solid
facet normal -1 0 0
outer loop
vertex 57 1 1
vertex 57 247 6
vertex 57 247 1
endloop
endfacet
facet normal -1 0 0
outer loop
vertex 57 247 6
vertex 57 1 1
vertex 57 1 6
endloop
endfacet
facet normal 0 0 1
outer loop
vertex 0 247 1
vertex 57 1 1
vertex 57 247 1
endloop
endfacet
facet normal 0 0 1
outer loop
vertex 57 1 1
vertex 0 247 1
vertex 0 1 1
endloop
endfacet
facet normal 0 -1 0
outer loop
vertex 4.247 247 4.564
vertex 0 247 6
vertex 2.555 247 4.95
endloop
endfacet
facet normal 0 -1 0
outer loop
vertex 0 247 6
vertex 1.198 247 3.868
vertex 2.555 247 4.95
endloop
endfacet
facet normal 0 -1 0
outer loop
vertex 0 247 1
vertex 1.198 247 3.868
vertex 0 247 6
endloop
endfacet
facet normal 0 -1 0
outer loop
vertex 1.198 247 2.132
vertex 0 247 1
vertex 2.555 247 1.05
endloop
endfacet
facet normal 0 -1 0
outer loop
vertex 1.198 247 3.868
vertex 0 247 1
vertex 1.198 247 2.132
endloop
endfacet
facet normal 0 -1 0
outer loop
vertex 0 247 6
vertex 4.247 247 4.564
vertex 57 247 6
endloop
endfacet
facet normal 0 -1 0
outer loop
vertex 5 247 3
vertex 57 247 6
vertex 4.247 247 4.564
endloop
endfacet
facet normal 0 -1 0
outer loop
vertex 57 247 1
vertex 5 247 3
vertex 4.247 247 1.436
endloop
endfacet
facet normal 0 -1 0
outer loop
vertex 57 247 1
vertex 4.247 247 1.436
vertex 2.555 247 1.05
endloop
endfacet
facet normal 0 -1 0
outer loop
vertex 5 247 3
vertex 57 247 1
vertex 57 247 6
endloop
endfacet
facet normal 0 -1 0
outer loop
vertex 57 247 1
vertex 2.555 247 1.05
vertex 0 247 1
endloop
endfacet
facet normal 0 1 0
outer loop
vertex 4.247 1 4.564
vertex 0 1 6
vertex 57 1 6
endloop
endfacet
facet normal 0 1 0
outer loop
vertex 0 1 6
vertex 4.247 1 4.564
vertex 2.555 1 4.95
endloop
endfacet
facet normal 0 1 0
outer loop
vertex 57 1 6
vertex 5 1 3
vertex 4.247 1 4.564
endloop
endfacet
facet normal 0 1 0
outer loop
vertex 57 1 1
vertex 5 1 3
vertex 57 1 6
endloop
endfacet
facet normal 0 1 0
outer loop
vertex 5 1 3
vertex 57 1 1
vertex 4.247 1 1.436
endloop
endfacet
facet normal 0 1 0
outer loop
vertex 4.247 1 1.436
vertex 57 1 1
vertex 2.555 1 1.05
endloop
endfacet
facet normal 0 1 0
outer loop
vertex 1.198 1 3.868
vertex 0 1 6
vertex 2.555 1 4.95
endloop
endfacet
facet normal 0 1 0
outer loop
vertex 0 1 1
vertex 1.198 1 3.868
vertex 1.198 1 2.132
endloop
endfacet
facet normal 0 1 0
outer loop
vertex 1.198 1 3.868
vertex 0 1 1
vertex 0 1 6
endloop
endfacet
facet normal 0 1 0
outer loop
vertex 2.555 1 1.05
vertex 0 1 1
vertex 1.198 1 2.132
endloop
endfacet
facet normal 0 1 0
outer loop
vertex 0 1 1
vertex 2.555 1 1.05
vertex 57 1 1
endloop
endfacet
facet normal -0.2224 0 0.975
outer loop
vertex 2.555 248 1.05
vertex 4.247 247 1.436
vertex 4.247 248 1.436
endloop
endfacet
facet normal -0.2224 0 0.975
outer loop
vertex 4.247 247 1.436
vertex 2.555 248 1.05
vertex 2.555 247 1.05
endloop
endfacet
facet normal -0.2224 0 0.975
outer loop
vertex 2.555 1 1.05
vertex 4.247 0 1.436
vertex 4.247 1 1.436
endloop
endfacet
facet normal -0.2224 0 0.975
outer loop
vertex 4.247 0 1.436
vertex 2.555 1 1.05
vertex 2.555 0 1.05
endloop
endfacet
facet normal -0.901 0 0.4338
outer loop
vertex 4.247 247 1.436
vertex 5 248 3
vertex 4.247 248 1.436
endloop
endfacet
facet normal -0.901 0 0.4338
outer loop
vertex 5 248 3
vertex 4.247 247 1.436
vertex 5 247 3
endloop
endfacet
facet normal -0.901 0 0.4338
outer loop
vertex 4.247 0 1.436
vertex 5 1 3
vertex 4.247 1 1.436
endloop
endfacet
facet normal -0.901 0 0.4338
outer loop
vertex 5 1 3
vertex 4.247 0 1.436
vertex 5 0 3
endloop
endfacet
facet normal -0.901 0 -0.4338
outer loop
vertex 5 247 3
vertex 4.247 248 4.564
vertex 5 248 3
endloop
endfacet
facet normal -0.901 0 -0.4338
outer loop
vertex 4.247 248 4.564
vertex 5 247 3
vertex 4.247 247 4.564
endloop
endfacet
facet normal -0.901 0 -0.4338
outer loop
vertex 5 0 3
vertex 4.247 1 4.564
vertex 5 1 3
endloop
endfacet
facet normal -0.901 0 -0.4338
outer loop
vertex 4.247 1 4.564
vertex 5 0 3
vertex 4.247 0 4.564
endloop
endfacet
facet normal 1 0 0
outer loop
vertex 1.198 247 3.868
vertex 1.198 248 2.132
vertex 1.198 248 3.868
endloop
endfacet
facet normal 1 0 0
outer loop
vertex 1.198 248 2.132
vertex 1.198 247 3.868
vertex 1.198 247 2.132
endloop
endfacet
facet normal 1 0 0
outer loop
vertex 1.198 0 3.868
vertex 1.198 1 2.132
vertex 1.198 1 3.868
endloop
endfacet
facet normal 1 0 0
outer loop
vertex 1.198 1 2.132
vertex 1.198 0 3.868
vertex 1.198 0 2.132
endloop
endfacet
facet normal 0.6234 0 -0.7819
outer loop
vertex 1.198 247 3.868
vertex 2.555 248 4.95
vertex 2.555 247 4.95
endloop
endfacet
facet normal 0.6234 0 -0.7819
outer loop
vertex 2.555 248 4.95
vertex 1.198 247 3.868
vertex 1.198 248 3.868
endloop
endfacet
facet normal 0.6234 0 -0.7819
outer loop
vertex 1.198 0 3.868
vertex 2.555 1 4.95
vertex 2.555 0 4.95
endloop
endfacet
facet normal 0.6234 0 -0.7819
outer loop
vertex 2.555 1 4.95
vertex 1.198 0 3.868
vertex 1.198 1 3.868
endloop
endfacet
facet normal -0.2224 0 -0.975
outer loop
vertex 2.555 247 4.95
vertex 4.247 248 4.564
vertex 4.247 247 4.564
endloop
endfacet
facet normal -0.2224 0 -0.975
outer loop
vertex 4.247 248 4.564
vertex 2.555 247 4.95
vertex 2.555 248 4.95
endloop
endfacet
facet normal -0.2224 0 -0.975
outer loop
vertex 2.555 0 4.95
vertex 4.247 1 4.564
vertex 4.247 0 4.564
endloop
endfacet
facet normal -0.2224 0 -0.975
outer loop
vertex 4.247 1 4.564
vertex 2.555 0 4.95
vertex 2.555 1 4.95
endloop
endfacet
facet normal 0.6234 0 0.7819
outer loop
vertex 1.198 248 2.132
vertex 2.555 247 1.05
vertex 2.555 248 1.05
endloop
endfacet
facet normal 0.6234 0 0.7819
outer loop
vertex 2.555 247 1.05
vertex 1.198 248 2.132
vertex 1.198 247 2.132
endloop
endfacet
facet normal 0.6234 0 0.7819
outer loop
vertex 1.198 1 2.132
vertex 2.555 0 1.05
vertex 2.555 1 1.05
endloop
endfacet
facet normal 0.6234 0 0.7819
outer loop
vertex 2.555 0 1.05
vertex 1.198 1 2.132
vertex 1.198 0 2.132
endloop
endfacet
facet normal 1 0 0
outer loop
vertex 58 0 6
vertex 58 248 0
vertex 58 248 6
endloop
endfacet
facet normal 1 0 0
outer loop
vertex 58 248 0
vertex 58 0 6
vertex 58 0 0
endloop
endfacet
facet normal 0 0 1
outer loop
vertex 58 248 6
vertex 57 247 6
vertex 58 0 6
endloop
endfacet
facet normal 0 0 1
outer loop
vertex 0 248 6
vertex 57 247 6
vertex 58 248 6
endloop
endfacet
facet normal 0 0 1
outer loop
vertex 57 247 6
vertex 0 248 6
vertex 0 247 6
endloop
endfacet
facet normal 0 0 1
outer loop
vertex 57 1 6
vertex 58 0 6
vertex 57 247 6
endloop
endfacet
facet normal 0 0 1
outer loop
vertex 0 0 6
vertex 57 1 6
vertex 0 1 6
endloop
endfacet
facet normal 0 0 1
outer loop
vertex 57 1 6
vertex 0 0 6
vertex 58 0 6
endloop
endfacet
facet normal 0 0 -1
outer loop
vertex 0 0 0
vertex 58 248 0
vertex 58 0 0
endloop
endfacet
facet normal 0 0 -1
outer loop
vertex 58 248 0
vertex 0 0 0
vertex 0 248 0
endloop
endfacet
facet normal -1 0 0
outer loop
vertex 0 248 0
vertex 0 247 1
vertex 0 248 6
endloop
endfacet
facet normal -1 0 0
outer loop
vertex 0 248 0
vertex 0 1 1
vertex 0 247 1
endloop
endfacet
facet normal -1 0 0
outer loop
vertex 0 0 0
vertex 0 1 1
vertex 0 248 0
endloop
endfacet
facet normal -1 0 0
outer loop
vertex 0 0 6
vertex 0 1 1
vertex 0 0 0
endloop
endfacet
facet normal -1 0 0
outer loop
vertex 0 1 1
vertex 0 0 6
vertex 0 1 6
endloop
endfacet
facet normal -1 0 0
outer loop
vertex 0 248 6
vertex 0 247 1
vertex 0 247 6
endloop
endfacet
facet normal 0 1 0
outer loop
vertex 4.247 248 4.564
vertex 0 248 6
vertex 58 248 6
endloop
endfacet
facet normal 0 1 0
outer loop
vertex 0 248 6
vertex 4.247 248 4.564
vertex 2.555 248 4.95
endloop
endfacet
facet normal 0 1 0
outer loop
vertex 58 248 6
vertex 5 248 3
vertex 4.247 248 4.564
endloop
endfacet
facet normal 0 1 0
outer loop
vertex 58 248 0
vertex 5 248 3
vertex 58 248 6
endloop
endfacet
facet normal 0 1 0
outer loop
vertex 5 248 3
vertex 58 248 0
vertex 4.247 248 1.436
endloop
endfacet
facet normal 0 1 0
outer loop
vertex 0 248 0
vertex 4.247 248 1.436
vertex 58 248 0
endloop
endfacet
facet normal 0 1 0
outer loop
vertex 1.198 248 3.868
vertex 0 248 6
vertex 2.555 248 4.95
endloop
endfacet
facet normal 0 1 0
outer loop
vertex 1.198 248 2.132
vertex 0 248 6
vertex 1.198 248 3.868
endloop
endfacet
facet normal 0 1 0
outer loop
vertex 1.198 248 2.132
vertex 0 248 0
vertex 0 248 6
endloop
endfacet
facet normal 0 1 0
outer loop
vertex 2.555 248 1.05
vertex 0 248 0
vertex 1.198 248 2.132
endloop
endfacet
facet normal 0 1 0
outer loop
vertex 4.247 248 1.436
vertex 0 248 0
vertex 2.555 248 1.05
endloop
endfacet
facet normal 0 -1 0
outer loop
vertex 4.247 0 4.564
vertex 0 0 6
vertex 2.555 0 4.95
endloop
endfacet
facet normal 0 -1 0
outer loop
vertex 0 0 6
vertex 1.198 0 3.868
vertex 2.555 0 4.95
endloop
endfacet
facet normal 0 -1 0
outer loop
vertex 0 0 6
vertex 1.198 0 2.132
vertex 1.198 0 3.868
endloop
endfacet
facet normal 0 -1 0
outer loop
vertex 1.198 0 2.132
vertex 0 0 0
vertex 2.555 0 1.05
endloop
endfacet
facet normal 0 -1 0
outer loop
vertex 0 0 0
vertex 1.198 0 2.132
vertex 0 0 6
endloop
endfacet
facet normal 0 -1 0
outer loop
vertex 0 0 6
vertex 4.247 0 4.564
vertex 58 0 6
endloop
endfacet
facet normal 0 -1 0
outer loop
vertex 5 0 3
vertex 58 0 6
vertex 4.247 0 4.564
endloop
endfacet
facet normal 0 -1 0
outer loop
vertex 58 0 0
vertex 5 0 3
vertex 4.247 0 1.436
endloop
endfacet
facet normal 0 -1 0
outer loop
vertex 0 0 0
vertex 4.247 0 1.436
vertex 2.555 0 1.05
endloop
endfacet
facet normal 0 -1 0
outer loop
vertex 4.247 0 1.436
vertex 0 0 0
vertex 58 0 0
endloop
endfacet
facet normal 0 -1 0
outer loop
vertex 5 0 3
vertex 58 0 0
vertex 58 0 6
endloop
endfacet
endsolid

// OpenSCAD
//Applies To Each "Individual" Container
Length_For_Each_Compartment = 20; //[1:50]

//Applies To Each "Individual" Container
Width_For_Each_Compartment = 35; //[1:50]

//Applies To Entire Model
Height_For_Entire_Model = 15; //[1:50]


//number of boxes

number_days = 7; // [1,2,3,4,5,6,7,8,9,10]
number_per_day = 3; // [1,2,3,4,5,6]

//letters

//One Letter Works Best
row_one = "B"; 

//One Letter Works Best
row_two = "L";

//One Letter Works Best
row_three = "D";

//One Letter Works Best
row_four = "4";

//One Letter Works Best
row_five = "5";

//One Letter Works Best
row_six = "6";

//nub parameter

nubs = 0; //[0:Yes,1:No,2]
//Click Yes If You Are Printing A Lid



//MODEL VARIABLES

//box
length_x = Length_For_Each_Compartment;
width_y = Width_For_Each_Compartment;
height_z = Height_For_Entire_Model;
o_x = length_x;
o_y = width_y;
o_z = height_z;
i_x = o_x-4;
i_y = o_y-4;
i_z = o_z;

//number of days
d = number_days-2;
e = number_days-1;

//number of times per day
n = number_per_day-2;
l = number_per_day-1;




//MODULE - subtraction

module inside(){
union()
{
translate([-1,1,1])cube([((length_x*number_per_day)-(2*l)+2),(width_y*number_days)+1,6]);

translate([3,-1,3])
{
rotate([270,0,0]){cylinder(400,2,2);
}
}
}
}

difference(){
translate([0,0,0])cube([((length_x*number_per_day)-(2*l)+2),(width_y*number_days)+3,6]);
inside();
}

